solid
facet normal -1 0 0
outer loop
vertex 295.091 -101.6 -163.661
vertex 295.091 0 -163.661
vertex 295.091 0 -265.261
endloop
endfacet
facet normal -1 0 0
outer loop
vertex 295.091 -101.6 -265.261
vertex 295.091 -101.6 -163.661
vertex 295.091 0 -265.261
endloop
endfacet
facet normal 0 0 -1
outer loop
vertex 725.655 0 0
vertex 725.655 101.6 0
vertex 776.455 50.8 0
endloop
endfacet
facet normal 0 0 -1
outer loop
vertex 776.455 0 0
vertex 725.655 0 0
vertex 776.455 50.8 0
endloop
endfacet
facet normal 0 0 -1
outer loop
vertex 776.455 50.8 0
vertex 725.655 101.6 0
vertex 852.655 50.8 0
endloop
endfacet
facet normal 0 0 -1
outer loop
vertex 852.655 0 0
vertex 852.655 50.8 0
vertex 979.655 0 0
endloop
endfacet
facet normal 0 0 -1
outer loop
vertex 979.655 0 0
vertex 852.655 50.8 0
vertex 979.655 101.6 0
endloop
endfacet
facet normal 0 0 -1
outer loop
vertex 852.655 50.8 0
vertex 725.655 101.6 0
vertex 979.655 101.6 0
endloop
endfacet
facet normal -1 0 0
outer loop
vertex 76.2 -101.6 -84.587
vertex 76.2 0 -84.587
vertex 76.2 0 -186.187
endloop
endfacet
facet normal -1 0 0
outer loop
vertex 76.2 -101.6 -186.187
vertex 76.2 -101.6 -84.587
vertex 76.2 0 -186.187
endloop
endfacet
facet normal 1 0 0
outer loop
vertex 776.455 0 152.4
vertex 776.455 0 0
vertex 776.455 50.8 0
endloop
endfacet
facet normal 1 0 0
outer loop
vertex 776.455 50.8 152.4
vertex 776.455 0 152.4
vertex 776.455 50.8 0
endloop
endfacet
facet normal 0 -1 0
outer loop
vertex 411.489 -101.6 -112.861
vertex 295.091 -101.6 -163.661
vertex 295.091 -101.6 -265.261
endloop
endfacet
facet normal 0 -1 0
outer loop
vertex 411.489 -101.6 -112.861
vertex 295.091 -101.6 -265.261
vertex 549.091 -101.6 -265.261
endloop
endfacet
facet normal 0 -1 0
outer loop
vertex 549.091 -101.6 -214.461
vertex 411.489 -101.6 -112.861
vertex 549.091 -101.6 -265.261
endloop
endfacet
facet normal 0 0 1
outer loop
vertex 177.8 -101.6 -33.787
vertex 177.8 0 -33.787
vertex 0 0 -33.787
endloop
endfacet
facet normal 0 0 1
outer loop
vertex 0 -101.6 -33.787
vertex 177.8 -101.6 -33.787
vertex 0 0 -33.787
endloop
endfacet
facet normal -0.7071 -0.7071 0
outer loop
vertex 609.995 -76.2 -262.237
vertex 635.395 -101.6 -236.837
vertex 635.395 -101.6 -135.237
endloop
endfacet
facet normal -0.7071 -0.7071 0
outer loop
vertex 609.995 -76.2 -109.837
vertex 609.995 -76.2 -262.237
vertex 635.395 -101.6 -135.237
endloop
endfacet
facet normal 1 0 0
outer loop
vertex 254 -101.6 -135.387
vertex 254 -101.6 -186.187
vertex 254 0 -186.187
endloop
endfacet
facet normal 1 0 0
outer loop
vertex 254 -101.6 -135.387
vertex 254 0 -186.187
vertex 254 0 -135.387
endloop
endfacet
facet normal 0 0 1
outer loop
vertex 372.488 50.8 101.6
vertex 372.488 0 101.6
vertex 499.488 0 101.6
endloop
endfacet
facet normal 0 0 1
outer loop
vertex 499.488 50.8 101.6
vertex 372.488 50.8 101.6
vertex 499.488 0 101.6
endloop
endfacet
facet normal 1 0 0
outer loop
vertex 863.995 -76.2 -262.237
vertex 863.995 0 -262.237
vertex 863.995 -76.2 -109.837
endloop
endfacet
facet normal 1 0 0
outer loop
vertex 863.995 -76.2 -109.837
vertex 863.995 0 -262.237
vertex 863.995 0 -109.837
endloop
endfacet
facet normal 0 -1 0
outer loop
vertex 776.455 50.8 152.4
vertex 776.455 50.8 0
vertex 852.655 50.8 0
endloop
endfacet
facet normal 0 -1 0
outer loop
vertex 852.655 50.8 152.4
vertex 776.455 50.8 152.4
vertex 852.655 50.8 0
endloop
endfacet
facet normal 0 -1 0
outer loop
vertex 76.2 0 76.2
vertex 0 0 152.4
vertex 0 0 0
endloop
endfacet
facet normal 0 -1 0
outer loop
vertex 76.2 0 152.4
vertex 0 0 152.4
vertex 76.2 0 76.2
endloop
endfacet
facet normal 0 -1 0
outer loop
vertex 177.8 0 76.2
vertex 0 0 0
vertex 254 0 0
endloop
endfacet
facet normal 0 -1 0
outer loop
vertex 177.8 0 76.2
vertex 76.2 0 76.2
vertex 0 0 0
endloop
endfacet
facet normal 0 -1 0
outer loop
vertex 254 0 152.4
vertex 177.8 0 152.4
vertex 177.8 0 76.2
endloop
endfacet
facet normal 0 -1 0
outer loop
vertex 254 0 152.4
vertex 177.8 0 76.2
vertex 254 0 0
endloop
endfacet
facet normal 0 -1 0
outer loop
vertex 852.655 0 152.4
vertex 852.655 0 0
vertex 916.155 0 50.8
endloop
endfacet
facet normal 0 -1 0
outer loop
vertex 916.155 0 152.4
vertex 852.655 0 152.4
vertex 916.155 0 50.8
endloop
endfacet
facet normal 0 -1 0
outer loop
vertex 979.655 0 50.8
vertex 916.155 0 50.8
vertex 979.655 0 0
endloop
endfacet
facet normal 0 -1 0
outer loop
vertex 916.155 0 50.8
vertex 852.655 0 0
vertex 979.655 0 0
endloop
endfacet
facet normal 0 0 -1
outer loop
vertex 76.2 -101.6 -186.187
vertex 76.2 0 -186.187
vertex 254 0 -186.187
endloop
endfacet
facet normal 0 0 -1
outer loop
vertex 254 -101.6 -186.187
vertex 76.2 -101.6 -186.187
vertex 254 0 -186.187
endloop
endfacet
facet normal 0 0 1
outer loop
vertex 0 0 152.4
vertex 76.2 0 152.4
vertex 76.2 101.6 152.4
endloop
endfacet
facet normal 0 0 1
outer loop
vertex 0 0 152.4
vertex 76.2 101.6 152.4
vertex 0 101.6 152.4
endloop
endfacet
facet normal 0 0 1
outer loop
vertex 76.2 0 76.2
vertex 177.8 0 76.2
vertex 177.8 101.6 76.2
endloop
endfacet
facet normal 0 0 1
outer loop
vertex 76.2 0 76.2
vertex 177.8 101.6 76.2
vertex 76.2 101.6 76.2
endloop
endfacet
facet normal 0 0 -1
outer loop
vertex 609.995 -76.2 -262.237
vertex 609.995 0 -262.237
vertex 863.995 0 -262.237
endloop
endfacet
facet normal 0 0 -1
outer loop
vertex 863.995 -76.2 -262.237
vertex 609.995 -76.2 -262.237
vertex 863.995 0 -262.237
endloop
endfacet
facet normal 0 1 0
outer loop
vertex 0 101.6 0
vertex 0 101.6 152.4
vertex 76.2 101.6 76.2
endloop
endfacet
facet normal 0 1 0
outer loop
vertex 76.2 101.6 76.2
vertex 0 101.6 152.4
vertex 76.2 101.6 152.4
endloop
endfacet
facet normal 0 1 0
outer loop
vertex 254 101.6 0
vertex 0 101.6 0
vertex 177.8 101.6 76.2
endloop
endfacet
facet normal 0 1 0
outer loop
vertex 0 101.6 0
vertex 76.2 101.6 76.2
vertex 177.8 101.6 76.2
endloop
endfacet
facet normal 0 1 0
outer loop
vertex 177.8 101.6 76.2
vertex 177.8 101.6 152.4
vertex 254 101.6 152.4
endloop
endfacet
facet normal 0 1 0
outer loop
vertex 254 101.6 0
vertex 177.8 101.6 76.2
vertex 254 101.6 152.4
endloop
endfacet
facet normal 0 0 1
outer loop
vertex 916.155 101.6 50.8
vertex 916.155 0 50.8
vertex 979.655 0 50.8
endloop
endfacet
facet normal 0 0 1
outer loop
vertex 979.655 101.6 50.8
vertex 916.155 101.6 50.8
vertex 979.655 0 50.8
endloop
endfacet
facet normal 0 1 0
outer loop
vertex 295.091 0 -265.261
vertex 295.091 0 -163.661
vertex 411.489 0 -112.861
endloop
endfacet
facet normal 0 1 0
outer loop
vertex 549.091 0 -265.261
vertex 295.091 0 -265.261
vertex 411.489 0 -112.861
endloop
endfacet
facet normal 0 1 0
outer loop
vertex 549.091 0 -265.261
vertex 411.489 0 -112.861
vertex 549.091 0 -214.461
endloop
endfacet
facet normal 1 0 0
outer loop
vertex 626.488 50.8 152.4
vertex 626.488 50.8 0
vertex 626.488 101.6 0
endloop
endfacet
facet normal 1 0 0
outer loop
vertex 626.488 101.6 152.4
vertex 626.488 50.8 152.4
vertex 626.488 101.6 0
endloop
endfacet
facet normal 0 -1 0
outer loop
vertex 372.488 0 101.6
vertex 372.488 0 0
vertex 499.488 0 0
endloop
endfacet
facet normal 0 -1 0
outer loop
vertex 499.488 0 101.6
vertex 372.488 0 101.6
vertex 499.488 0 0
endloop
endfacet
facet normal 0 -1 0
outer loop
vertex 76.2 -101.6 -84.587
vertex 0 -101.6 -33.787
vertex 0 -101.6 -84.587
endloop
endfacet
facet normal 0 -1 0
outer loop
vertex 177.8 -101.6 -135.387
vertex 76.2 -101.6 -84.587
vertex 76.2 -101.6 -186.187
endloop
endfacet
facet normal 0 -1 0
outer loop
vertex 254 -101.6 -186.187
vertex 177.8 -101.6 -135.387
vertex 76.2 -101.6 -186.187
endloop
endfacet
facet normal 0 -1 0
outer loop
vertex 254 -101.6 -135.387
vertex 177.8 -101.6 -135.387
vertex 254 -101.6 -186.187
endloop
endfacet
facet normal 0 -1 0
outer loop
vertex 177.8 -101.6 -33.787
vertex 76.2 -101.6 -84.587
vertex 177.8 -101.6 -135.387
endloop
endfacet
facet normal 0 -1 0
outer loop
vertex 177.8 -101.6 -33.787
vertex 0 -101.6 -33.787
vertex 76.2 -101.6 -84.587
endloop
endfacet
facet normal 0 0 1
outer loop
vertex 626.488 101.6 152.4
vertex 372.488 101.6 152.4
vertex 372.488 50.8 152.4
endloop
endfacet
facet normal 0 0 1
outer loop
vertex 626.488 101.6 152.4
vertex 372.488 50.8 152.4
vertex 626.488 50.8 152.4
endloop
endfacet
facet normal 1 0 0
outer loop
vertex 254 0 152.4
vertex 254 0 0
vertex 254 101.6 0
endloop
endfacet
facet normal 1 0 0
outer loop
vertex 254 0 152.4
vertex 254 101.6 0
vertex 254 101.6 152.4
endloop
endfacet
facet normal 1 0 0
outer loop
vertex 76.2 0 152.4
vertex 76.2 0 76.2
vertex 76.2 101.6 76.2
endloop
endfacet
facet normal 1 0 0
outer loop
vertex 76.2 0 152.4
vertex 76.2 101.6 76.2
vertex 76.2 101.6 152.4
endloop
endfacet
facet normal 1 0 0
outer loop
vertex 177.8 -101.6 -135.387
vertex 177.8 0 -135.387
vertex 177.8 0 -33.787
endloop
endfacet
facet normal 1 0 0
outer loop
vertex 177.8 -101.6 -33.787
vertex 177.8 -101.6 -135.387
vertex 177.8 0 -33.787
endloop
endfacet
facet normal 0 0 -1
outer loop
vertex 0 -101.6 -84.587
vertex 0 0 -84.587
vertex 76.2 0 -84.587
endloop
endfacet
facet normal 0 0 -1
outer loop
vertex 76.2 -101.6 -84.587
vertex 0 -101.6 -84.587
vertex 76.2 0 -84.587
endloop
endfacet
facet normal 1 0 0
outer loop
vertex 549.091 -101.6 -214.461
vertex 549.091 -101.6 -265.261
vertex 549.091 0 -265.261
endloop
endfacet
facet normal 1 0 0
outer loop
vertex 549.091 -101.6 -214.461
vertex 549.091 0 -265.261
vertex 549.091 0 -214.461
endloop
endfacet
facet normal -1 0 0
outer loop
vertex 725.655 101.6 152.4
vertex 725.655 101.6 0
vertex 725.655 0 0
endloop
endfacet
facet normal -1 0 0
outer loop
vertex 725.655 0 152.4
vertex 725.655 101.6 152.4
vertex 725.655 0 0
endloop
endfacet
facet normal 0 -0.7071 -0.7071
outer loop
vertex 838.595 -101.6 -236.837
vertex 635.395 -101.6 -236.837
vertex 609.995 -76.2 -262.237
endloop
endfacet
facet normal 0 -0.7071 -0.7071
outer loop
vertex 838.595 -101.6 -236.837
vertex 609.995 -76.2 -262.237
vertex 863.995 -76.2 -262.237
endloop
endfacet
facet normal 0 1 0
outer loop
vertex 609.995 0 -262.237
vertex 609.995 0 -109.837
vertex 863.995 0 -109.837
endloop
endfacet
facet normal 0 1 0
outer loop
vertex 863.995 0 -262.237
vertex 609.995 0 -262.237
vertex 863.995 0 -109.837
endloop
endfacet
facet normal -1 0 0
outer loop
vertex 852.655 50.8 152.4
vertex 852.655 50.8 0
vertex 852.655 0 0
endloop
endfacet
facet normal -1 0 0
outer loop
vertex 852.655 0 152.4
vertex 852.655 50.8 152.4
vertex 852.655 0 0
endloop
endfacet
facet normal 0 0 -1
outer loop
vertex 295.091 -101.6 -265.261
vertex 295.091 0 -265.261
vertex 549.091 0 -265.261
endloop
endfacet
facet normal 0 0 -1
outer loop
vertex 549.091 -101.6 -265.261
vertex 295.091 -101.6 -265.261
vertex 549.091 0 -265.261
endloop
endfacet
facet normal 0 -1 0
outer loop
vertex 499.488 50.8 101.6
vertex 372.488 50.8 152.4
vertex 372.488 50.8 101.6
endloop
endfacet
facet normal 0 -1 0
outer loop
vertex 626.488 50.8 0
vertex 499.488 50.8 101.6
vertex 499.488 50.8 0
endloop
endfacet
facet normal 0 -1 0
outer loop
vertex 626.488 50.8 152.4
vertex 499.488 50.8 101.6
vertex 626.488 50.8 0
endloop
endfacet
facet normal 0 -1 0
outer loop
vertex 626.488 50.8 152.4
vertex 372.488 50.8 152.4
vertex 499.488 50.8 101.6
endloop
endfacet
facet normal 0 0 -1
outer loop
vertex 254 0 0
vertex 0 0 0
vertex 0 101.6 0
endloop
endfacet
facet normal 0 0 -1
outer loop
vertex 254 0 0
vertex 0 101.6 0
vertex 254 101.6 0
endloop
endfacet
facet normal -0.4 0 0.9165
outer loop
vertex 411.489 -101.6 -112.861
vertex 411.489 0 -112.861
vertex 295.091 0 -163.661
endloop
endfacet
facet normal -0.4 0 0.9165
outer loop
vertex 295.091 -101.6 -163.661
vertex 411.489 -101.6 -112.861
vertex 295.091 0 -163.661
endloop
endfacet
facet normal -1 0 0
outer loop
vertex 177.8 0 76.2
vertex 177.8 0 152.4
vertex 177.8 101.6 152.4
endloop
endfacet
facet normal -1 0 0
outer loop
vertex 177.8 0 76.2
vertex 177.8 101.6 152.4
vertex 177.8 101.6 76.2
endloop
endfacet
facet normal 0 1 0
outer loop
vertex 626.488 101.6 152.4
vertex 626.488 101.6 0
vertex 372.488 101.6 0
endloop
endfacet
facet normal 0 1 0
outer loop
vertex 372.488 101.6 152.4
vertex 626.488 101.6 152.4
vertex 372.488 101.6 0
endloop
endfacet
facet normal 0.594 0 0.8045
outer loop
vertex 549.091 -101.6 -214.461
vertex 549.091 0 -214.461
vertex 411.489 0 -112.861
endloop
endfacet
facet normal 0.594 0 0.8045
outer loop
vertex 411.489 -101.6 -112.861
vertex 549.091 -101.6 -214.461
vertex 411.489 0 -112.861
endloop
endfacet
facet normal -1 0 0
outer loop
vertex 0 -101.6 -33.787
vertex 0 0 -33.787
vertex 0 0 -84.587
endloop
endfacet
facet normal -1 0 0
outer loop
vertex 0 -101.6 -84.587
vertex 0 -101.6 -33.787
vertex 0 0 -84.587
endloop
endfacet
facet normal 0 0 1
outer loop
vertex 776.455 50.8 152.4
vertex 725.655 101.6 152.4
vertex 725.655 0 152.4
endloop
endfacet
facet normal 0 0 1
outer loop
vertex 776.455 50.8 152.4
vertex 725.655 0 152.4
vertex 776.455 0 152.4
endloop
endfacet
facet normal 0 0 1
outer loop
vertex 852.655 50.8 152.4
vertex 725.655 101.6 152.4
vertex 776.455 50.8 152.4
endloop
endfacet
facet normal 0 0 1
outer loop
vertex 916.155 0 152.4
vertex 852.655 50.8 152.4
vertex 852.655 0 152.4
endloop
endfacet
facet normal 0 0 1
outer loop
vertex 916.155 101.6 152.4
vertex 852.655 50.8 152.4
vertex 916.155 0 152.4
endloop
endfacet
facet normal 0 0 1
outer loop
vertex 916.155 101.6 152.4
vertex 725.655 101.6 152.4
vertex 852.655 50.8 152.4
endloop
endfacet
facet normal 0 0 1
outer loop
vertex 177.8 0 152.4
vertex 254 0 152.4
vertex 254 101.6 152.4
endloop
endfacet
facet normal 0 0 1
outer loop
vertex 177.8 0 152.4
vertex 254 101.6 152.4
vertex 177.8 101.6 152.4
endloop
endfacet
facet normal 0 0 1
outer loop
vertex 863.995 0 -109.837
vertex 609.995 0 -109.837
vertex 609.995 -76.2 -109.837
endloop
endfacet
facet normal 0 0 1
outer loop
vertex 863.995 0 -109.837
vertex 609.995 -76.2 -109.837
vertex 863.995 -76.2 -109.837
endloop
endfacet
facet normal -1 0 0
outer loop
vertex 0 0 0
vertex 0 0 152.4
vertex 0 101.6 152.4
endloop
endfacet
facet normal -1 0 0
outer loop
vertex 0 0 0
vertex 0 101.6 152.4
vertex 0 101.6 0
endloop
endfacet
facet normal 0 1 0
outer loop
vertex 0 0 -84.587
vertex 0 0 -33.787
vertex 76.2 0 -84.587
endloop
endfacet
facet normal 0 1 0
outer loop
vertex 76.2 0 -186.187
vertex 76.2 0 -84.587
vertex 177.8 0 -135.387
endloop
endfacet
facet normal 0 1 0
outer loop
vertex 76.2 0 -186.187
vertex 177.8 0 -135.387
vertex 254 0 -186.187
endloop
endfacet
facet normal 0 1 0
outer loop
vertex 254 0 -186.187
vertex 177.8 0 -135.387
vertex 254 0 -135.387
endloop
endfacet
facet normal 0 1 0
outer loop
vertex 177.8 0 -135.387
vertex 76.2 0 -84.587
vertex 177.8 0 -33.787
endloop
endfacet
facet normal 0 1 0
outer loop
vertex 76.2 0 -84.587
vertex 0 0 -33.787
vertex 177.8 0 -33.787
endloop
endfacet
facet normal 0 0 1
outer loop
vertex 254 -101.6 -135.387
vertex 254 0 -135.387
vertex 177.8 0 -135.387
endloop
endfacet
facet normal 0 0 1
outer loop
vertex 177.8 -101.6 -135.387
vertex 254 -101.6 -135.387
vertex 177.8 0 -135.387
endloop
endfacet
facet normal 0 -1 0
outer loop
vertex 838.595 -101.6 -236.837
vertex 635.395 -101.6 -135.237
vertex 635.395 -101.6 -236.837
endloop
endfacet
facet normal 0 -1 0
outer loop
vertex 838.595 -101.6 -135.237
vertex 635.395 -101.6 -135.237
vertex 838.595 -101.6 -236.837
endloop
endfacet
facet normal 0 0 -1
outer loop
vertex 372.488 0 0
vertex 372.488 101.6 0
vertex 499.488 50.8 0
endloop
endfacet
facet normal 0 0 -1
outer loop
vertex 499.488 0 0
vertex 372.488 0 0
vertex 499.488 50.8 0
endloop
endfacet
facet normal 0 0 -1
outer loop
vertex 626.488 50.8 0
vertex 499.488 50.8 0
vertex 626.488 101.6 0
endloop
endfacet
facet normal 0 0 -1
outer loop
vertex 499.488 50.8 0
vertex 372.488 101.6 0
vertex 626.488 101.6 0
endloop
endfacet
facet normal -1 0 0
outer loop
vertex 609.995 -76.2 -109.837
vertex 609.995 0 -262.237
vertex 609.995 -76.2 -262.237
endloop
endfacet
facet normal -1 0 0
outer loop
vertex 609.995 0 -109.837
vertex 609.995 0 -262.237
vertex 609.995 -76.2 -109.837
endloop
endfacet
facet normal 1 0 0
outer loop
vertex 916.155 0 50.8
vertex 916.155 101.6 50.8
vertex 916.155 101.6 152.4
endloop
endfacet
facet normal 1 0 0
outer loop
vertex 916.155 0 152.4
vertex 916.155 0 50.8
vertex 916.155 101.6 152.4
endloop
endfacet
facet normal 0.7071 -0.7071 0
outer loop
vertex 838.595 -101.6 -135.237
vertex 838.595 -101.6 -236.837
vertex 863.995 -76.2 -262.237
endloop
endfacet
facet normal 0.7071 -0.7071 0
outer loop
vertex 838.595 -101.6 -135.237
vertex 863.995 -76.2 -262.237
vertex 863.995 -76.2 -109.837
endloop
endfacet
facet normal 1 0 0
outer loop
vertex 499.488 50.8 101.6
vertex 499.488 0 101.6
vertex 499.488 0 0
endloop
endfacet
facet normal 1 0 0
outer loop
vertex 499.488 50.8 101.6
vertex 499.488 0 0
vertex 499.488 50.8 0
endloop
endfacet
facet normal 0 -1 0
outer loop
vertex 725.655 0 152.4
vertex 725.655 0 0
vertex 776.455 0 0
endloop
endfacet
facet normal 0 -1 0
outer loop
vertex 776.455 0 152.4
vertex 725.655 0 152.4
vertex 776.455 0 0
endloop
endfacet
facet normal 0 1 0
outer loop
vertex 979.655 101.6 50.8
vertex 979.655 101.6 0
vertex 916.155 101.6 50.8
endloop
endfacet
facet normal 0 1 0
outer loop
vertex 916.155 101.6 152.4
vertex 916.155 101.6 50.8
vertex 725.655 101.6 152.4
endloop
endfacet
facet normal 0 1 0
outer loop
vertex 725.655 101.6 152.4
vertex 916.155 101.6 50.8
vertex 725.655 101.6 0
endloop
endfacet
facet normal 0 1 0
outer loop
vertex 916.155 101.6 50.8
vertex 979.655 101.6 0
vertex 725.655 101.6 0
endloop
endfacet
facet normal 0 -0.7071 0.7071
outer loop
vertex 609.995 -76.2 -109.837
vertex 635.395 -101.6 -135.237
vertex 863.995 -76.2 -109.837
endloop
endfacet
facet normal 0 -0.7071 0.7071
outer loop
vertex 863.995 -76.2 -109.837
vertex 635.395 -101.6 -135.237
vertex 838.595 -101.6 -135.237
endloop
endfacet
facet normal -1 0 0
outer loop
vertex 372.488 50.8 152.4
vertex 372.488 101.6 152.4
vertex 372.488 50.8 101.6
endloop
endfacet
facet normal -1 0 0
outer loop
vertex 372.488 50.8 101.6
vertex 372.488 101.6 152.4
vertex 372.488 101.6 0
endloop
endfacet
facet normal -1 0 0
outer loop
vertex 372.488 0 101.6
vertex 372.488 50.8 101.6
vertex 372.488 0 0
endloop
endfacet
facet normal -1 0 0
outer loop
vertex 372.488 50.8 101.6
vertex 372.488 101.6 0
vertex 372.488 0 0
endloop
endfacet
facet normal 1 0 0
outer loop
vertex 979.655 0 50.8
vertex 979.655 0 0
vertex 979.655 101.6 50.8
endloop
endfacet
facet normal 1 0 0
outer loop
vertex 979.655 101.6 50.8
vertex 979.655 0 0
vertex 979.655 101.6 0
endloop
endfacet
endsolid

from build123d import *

# Parameters (mm, degrees)
F1_DEPTH  = 101.6
F3_DEPTH  = 152.4
F4_W      = 127
F4_H      = 50.8
F5_DEPTH  = 50.8
F7_DEPTH  = 152.4
F8_W      = 63.5
F8_H      = 101.6
F9_DEPTH  = 101.6
F12_DEPTH = 101.6
F13_DEPTH = 101.6
F14_W     = 254
F14_H     = 152.4
F15_DEPTH = 101.6
F16_SIZE  = 25.4


with BuildPart() as f1:
    # F0 (on Front) → F1 (new body)
    with BuildSketch(Plane.XZ):
        Polygon((0, 152.4), (0, 0), (254, 0), (254, 152.4), (177.8, 152.4), (177.8, 76.2), (76.2, 76.2), (76.2, 152.4), align=None)
    extrude(amount=-F1_DEPTH)


with BuildPart() as f3:
    # F2 (on Top) → F3 (new body)
    with BuildSketch(Plane.XY):
        Polygon((372.488037, 101.6), (372.488037, 0), (499.488037, 0), (499.488037, 50.8), (626.488037, 50.8), (626.488037, 101.6), align=None)
    extrude(amount=F3_DEPTH)

    # F4 (on face) → F5 (cut)
    with BuildSketch(Plane.XZ):
        with Locations((435.988037, 127)):
            Rectangle(F4_W, F4_H)
    extrude(amount=-F5_DEPTH, mode=Mode.SUBTRACT)


with BuildPart() as f7:
    # F6 (on Top) → F7 (new body)
    with BuildSketch(Plane.XY):
        Polygon((979.655309, 101.6), (725.655309, 101.6), (725.655309, 0), (776.455309, 0), (776.455309, 50.8), (852.655309, 50.8), (852.655309, 0), (979.655309, 0), align=None)
    extrude(amount=F7_DEPTH)

    # F8 (on face) → F9 (cut)
    with BuildSketch(Plane.XZ):
        with Locations((947.905309, 101.6)):
            Rectangle(F8_W, F8_H)
    extrude(amount=-F9_DEPTH, mode=Mode.SUBTRACT)


with BuildPart() as f12:
    # F10 (on Front) → F12 (new body)
    with BuildSketch(Plane.XZ):
        Polygon((177.8, -33.786778), (0, -33.786778), (0, -84.586778), (76.2, -84.586778), (76.2, -186.186778), (254, -186.186778), (254, -135.386778), (177.8, -135.386778), align=None)
    extrude(amount=F12_DEPTH)


with BuildPart() as f13:
    # F11 (on Front) → F13 (new body)
    with BuildSketch(Plane.XZ):
        Polygon((411.488872, -112.860752), (295.091449, -163.660752), (295.091449, -265.260752), (549.091449, -265.260752), (549.091449, -214.460752), align=None)
    extrude(amount=F13_DEPTH)


with BuildPart() as f15:
    # F14 (on Front) → F15 (new body)
    with BuildSketch(Plane.XZ):
        with Locations((736.99488, -186.036799)):
            Rectangle(F14_W, F14_H)
    extrude(amount=F15_DEPTH)

    # F16
    f16_edges = [f15.edges().sort_by_distance(p)[0] for p in [
        (736.99488, -101.6, -109.836799),
        (609.99488, -101.6, -186.036799),
        (736.99488, -101.6, -262.236799),
        (863.99488, -101.6, -186.036799),
    ]]
    chamfer(f16_edges, length=F16_SIZE)


solid = Compound([f1.part, f3.part, f7.part, f12.part, f13.part, f15.part])
